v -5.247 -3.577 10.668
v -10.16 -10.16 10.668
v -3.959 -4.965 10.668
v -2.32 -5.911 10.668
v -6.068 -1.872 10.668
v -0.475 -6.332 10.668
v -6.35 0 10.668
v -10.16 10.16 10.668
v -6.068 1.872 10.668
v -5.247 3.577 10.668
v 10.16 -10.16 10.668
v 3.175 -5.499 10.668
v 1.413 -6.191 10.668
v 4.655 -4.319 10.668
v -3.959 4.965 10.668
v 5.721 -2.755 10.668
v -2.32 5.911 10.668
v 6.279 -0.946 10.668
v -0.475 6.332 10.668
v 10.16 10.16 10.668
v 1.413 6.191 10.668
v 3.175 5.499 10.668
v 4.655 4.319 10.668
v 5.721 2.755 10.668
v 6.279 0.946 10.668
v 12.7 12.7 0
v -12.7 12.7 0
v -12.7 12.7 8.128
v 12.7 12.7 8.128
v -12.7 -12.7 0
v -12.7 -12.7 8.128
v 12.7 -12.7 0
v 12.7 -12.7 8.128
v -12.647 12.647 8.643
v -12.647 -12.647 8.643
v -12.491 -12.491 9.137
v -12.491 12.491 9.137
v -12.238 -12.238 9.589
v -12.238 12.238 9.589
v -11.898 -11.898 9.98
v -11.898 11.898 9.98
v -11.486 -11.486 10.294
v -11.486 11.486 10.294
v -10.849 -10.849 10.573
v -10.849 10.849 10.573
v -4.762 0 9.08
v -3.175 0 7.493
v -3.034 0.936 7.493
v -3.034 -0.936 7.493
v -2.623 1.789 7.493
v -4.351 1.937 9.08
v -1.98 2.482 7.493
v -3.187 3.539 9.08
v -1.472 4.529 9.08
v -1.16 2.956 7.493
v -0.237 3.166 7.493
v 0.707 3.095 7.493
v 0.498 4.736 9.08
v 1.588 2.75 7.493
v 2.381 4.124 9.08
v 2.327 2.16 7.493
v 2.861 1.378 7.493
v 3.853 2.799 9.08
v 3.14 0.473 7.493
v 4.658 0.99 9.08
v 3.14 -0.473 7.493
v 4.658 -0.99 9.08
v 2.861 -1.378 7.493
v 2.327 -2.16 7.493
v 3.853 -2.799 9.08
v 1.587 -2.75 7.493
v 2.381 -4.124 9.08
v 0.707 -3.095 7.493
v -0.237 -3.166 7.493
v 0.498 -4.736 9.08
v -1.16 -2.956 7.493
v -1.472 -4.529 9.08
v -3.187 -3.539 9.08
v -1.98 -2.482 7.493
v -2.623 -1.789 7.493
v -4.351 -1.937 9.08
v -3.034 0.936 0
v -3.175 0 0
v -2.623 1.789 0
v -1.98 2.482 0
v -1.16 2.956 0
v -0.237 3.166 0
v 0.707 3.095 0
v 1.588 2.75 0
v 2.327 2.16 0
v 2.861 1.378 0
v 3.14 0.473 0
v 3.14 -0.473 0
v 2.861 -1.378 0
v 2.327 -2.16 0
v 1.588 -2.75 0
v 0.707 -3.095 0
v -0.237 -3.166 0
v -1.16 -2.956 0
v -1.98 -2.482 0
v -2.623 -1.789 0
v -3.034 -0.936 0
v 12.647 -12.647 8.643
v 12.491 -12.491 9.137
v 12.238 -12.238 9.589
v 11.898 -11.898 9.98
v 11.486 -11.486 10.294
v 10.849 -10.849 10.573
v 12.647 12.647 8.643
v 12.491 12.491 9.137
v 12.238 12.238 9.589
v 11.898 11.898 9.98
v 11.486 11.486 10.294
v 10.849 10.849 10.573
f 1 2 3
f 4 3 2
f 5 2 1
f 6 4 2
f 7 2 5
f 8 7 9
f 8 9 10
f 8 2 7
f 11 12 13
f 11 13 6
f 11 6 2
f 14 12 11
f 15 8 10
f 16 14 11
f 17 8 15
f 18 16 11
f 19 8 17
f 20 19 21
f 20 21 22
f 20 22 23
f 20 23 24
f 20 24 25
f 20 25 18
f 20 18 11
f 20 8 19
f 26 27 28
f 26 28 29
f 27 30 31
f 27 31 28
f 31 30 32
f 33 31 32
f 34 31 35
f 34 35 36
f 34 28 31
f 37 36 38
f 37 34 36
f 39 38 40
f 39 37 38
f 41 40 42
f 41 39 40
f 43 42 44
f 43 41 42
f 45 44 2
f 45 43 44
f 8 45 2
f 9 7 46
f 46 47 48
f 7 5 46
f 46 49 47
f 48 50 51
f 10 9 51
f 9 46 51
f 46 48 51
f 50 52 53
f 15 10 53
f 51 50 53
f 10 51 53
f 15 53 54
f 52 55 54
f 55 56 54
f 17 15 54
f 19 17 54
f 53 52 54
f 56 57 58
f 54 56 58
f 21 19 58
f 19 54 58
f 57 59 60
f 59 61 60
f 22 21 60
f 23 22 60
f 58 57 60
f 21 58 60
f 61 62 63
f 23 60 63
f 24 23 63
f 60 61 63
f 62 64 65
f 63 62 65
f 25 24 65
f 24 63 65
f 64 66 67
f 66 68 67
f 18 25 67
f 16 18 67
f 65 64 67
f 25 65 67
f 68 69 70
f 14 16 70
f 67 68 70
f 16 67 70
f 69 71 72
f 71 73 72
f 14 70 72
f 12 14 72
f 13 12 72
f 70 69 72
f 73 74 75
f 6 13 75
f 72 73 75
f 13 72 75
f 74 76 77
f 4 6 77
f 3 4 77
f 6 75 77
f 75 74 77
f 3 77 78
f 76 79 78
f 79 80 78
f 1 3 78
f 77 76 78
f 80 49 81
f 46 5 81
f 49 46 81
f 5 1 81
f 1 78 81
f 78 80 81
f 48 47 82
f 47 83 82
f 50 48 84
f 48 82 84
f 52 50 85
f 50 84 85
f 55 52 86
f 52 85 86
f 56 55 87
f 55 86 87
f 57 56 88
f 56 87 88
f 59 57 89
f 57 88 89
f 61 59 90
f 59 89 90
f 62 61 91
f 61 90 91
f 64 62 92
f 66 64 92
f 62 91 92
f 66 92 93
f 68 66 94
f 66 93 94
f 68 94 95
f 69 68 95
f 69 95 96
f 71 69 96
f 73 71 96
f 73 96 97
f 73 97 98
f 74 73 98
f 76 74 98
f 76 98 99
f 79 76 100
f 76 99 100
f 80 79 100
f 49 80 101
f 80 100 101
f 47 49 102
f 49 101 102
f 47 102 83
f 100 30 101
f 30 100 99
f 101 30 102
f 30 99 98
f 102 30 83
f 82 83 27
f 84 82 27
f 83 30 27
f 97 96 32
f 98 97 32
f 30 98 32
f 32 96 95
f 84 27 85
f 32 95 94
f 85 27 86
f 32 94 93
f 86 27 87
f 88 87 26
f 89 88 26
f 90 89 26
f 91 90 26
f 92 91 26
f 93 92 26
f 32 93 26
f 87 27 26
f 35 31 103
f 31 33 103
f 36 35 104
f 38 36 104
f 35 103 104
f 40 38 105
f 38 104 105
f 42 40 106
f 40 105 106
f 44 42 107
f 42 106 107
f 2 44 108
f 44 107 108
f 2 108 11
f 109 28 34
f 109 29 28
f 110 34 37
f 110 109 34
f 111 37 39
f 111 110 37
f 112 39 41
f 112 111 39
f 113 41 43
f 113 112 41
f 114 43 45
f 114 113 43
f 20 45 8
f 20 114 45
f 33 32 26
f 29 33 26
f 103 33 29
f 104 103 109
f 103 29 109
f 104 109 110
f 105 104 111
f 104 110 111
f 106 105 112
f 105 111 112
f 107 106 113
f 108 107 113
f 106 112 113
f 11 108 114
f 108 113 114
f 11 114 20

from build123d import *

# Parameters (mm, degrees)
F0_W           = 25.4
F0_H           = 25.4
F1_DEPTH       = 10.668
F2_R           = 2.54
F4_D           = 6.35
F4_CSINK_D     = 12.7
F4_CSINK_ANGLE = 90


with BuildPart() as f1:
    # F0 (on Top) → F1 (new body)
    with BuildSketch(Plane.XY):
        Rectangle(F0_W, F0_H)
    extrude(amount=F1_DEPTH)

    # F2
    f2_edges = [f1.edges().sort_by_distance(p)[0] for p in [
        (0, -12.7, 10.668),
        (0, 12.7, 10.668),
        (12.7, 0, 10.668),
        (-12.7, 0, 10.668),
    ]]
    fillet(f2_edges, radius=F2_R)

    # F4 (through all)
    with Locations(Plane.XY.offset(10.668)):
        with Locations((0, 0)):
            CounterSinkHole(F4_D / 2, F4_CSINK_D / 2, counter_sink_angle=F4_CSINK_ANGLE)


solid = f1.part
